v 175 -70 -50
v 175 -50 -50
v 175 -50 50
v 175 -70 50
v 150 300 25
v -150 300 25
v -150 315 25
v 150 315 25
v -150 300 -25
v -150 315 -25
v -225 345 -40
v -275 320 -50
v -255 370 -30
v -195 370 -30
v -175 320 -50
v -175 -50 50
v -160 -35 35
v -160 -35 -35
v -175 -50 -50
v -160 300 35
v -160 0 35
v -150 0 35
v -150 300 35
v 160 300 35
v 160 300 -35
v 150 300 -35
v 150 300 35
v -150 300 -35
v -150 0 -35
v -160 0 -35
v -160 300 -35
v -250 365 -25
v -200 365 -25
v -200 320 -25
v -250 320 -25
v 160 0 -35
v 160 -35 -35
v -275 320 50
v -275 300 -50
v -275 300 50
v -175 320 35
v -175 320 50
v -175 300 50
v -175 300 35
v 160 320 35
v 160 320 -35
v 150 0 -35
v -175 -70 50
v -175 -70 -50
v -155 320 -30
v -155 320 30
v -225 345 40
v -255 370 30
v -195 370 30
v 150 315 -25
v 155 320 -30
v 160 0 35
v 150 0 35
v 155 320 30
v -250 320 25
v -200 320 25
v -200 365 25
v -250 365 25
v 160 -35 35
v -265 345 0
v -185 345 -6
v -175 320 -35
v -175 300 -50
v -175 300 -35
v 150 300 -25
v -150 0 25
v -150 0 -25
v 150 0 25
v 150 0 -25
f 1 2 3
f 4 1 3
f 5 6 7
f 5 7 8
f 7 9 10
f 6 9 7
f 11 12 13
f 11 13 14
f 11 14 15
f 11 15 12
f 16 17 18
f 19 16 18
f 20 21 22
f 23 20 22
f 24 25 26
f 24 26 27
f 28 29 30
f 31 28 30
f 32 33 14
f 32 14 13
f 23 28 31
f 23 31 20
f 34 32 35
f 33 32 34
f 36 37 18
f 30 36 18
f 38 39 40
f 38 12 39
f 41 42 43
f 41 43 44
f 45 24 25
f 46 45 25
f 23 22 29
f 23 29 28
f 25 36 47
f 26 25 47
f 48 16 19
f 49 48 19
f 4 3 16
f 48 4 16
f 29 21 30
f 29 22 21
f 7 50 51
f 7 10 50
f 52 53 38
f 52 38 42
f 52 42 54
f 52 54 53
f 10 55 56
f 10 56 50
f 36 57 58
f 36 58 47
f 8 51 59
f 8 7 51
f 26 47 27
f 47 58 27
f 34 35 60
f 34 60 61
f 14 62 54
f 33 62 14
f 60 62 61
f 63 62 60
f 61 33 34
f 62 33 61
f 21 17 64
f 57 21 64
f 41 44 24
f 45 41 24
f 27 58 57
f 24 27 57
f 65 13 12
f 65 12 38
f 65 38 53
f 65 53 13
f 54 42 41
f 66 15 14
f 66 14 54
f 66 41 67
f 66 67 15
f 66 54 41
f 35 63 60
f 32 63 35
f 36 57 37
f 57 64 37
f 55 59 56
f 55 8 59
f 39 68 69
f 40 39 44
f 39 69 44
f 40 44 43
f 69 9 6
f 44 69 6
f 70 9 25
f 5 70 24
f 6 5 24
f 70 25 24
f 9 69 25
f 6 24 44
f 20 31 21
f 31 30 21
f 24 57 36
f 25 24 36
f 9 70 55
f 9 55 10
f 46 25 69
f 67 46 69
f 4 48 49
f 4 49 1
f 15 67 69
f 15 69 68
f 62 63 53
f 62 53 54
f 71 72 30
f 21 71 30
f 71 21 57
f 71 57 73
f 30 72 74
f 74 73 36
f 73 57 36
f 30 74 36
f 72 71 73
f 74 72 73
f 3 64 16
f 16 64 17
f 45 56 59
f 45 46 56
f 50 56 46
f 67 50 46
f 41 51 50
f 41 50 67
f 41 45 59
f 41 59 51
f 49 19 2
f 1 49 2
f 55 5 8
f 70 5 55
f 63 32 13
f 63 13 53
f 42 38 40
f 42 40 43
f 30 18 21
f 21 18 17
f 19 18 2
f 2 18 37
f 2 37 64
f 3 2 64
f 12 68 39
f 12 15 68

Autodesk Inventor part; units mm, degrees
sketch "Sketch1" plane through (0, 0, 0) normal (0, 1, 0) x (-1, 0, 0)
  line L0 (150, 25) -> (-150, 25)
  line L1 (-150, 25) -> (-150, -25)
  line L2 (-150, -25) -> (150, -25)
  line L3 (150, -25) -> (150, 25)
  line L4 (150, 25) -> (-150, -25) construction
  line L5 (-150, 25) -> (150, -25) construction
  line L6 (160, 35) -> (-160, 35)
  line L7 (-160, 35) -> (-160, -35)
  line L8 (-160, -35) -> (160, -35)
  line L9 (160, -35) -> (160, 35)
  line L10 (160, 35) -> (-160, -35) construction
  line L11 (-160, 35) -> (160, -35) construction
  point P0 (0, 0)
  dimension "d0" = 300
  dimension "d1" = 50
  dimension "d2" = 320
  dimension "d3" = 70
extrude "Extrusion1" add sketch "Sketch1" along normal blind 320
ref_plane "Work Plane1" through (0, 300, 0) normal (0, 1, 0) x (1, 0, 0)
sketch "Sketch2" plane through (0, 0, 0) normal (0, -1, 0) x (1, 0, 0)
  line L0 (160, 35) -> (160, -35) projected
  line L1 (-160, -35) -> (160, -35)
  line L2 (160, -35) -> (160, 35)
  line L3 (160, 35) -> (-160, 35)
  line L4 (-160, 35) -> (-160, -35)
  line L5 (-160, -35) -> (160, 35) construction
  line L6 (160, -35) -> (-160, 35) construction
  point P0 (0, 0)
extrude "Extrusion2" add sketch "Sketch2" along normal blind 50
sketch "Sketch3" plane through (0, -50, 0) normal (0, -1, 0) x (1, 0, 0)
  line L0 (-175, -50) -> (175, -50)
  line L1 (175, -50) -> (175, 50)
  line L2 (175, 50) -> (-175, 50)
  line L3 (-175, 50) -> (-175, -50)
  line L4 (-175, -50) -> (175, 50) construction
  line L5 (175, -50) -> (-175, 50) construction
  point P0 (0, 0)
  dimension "d9" = 350
  dimension "d10" = 100
extrude "Extrusion3" add sketch "Sketch3" along normal blind 20
chamfer "Chamfer1" distance 15 angle 45 4 edges at (0, -50, 35) (-160, -50, 0) (0, -50, -35) (160, -50, 0)
chamfer "Chamfer2" distance 5 angle 45 4 edges at (0, 320, -25) (-150, 320, 0) (0, 320, 25) (150, 320, 0)
split body "Split1" result two bodies by plane through (0, 300, 0) normal (0, 1, 0) first body at (50, 300.5, 31.6667)
ref_plane "Work Plane2" through (0, 0, 0) normal (0, -1, 0) x (1, 0, 0)
split body "Split2" result two bodies by plane through (0, 0, 0) normal (0, -1, 0) bodies 3 first body at (58.3333, -69.5, -16.6667)
sketch "Sketch4" plane through (-160, 300, 35) normal (0, 0, 1) x (1, 0, 0)
  line L0 (10, -300) -> (10, 0) projected
  line L1 (310, -300) -> (310, 0) projected
  line L2 (10, 0) -> (310, 0)
  line L3 (310, 0) -> (310, -300)
  line L4 (310, -300) -> (10, -300)
  line L5 (10, -300) -> (10, 0)
  point P0 (160, -300)
extrude "Extrusion4" cut sketch "Sketch4" against normal through all bodies 5
sketch "Sketch5" plane through (0, 320, 0) normal (0, 1, 0) x (1, 0, 0)
  line L0 (-175, -50) -> (-175, 50) projected
  line L1 (-175, 50) -> (-275, 50)
  line L2 (-275, 50) -> (-275, -50)
  line L3 (-275, -50) -> (-175, -50)
  line L4 (-175, -50) -> (-175, 50)
  line L5 (-160, 35) -> (160, 35) projected
  line L6 (-160, 35) -> (-175, 35)
  line L7 (-175, 35) -> (-175, -35)
  line L8 (-175, -35) -> (-160, -35)
  line L9 (-160, -35) -> (-160, 35)
  point P0 (0, 0)
  dimension "d22" = 100
  dimension "d23" = 100
  dimension "d24" = 15
  dimension "d25" = 70
extrude "Extrusion5" add sketch "Sketch5" against normal blind 20 bodies 2
ref_plane "Work Plane3" through (0, 370, 0) normal (0, 1, 0) x (1, 0, 0)
sketch "Sketch7" plane through (0, 370, 0) normal (0, 1, 0) x (1, 0, 0)
  line L0 (-255, 30) -> (-195, 30)
  line L1 (-195, 30) -> (-195, -30)
  line L2 (-195, -30) -> (-255, -30)
  line L3 (-255, -30) -> (-255, 30)
  line L4 (-175, 50) -> (-275, 50) projected
  line L5 (-275, 50) -> (-275, -50) projected
  point P0 (0, 0)
  dimension "d33" = 60
  dimension "d34" = 60
  dimension "d35" = 20
  dimension "d36" = 20
sketch "Sketch8" plane through (0, 320, 0) normal (0, 1, 0) x (1, 0, 0)
  line L0 (-275, 50) -> (-275, -50) projected
  line L1 (-175, -50) -> (-275, -50) projected
  line L2 (-275, 50) -> (-175, 50)
  line L3 (-175, 50) -> (-175, -50)
  line L4 (-175, -50) -> (-275, -50)
  line L5 (-275, -50) -> (-275, 50)
  point P0 (0, 0)
loft "Loft1" add profiles "Sketch8", "Sketch7" bodies 2
sketch "Sketch9" plane through (-255, 370, 30) normal (0, 1, 0) x (1, 0, 0)
  line L0 (5, 55) -> (55, 55)
  line L1 (55, 55) -> (55, 5)
  line L2 (55, 5) -> (5, 5)
  line L3 (5, 5) -> (5, 55)
  line L4 (60, 60) -> (0, 60) projected
  line L5 (0, 60) -> (0, 0) projected
  point P0 (255, 30)
  dimension "d41" = 50
  dimension "d42" = 50
  dimension "d43" = 5
  dimension "d44" = 5
extrude "Extrusion6" cut sketch "Sketch9" against normal blind 50 bodies 2
chamfer "Chamfer3" distance 5 angle 45 4 edges at (-225, 370, -25) (-200, 370, 0) (-225, 370, 25) (-250, 370, 0)
equation "\"d4\" = d2"
properties part number "Box"
